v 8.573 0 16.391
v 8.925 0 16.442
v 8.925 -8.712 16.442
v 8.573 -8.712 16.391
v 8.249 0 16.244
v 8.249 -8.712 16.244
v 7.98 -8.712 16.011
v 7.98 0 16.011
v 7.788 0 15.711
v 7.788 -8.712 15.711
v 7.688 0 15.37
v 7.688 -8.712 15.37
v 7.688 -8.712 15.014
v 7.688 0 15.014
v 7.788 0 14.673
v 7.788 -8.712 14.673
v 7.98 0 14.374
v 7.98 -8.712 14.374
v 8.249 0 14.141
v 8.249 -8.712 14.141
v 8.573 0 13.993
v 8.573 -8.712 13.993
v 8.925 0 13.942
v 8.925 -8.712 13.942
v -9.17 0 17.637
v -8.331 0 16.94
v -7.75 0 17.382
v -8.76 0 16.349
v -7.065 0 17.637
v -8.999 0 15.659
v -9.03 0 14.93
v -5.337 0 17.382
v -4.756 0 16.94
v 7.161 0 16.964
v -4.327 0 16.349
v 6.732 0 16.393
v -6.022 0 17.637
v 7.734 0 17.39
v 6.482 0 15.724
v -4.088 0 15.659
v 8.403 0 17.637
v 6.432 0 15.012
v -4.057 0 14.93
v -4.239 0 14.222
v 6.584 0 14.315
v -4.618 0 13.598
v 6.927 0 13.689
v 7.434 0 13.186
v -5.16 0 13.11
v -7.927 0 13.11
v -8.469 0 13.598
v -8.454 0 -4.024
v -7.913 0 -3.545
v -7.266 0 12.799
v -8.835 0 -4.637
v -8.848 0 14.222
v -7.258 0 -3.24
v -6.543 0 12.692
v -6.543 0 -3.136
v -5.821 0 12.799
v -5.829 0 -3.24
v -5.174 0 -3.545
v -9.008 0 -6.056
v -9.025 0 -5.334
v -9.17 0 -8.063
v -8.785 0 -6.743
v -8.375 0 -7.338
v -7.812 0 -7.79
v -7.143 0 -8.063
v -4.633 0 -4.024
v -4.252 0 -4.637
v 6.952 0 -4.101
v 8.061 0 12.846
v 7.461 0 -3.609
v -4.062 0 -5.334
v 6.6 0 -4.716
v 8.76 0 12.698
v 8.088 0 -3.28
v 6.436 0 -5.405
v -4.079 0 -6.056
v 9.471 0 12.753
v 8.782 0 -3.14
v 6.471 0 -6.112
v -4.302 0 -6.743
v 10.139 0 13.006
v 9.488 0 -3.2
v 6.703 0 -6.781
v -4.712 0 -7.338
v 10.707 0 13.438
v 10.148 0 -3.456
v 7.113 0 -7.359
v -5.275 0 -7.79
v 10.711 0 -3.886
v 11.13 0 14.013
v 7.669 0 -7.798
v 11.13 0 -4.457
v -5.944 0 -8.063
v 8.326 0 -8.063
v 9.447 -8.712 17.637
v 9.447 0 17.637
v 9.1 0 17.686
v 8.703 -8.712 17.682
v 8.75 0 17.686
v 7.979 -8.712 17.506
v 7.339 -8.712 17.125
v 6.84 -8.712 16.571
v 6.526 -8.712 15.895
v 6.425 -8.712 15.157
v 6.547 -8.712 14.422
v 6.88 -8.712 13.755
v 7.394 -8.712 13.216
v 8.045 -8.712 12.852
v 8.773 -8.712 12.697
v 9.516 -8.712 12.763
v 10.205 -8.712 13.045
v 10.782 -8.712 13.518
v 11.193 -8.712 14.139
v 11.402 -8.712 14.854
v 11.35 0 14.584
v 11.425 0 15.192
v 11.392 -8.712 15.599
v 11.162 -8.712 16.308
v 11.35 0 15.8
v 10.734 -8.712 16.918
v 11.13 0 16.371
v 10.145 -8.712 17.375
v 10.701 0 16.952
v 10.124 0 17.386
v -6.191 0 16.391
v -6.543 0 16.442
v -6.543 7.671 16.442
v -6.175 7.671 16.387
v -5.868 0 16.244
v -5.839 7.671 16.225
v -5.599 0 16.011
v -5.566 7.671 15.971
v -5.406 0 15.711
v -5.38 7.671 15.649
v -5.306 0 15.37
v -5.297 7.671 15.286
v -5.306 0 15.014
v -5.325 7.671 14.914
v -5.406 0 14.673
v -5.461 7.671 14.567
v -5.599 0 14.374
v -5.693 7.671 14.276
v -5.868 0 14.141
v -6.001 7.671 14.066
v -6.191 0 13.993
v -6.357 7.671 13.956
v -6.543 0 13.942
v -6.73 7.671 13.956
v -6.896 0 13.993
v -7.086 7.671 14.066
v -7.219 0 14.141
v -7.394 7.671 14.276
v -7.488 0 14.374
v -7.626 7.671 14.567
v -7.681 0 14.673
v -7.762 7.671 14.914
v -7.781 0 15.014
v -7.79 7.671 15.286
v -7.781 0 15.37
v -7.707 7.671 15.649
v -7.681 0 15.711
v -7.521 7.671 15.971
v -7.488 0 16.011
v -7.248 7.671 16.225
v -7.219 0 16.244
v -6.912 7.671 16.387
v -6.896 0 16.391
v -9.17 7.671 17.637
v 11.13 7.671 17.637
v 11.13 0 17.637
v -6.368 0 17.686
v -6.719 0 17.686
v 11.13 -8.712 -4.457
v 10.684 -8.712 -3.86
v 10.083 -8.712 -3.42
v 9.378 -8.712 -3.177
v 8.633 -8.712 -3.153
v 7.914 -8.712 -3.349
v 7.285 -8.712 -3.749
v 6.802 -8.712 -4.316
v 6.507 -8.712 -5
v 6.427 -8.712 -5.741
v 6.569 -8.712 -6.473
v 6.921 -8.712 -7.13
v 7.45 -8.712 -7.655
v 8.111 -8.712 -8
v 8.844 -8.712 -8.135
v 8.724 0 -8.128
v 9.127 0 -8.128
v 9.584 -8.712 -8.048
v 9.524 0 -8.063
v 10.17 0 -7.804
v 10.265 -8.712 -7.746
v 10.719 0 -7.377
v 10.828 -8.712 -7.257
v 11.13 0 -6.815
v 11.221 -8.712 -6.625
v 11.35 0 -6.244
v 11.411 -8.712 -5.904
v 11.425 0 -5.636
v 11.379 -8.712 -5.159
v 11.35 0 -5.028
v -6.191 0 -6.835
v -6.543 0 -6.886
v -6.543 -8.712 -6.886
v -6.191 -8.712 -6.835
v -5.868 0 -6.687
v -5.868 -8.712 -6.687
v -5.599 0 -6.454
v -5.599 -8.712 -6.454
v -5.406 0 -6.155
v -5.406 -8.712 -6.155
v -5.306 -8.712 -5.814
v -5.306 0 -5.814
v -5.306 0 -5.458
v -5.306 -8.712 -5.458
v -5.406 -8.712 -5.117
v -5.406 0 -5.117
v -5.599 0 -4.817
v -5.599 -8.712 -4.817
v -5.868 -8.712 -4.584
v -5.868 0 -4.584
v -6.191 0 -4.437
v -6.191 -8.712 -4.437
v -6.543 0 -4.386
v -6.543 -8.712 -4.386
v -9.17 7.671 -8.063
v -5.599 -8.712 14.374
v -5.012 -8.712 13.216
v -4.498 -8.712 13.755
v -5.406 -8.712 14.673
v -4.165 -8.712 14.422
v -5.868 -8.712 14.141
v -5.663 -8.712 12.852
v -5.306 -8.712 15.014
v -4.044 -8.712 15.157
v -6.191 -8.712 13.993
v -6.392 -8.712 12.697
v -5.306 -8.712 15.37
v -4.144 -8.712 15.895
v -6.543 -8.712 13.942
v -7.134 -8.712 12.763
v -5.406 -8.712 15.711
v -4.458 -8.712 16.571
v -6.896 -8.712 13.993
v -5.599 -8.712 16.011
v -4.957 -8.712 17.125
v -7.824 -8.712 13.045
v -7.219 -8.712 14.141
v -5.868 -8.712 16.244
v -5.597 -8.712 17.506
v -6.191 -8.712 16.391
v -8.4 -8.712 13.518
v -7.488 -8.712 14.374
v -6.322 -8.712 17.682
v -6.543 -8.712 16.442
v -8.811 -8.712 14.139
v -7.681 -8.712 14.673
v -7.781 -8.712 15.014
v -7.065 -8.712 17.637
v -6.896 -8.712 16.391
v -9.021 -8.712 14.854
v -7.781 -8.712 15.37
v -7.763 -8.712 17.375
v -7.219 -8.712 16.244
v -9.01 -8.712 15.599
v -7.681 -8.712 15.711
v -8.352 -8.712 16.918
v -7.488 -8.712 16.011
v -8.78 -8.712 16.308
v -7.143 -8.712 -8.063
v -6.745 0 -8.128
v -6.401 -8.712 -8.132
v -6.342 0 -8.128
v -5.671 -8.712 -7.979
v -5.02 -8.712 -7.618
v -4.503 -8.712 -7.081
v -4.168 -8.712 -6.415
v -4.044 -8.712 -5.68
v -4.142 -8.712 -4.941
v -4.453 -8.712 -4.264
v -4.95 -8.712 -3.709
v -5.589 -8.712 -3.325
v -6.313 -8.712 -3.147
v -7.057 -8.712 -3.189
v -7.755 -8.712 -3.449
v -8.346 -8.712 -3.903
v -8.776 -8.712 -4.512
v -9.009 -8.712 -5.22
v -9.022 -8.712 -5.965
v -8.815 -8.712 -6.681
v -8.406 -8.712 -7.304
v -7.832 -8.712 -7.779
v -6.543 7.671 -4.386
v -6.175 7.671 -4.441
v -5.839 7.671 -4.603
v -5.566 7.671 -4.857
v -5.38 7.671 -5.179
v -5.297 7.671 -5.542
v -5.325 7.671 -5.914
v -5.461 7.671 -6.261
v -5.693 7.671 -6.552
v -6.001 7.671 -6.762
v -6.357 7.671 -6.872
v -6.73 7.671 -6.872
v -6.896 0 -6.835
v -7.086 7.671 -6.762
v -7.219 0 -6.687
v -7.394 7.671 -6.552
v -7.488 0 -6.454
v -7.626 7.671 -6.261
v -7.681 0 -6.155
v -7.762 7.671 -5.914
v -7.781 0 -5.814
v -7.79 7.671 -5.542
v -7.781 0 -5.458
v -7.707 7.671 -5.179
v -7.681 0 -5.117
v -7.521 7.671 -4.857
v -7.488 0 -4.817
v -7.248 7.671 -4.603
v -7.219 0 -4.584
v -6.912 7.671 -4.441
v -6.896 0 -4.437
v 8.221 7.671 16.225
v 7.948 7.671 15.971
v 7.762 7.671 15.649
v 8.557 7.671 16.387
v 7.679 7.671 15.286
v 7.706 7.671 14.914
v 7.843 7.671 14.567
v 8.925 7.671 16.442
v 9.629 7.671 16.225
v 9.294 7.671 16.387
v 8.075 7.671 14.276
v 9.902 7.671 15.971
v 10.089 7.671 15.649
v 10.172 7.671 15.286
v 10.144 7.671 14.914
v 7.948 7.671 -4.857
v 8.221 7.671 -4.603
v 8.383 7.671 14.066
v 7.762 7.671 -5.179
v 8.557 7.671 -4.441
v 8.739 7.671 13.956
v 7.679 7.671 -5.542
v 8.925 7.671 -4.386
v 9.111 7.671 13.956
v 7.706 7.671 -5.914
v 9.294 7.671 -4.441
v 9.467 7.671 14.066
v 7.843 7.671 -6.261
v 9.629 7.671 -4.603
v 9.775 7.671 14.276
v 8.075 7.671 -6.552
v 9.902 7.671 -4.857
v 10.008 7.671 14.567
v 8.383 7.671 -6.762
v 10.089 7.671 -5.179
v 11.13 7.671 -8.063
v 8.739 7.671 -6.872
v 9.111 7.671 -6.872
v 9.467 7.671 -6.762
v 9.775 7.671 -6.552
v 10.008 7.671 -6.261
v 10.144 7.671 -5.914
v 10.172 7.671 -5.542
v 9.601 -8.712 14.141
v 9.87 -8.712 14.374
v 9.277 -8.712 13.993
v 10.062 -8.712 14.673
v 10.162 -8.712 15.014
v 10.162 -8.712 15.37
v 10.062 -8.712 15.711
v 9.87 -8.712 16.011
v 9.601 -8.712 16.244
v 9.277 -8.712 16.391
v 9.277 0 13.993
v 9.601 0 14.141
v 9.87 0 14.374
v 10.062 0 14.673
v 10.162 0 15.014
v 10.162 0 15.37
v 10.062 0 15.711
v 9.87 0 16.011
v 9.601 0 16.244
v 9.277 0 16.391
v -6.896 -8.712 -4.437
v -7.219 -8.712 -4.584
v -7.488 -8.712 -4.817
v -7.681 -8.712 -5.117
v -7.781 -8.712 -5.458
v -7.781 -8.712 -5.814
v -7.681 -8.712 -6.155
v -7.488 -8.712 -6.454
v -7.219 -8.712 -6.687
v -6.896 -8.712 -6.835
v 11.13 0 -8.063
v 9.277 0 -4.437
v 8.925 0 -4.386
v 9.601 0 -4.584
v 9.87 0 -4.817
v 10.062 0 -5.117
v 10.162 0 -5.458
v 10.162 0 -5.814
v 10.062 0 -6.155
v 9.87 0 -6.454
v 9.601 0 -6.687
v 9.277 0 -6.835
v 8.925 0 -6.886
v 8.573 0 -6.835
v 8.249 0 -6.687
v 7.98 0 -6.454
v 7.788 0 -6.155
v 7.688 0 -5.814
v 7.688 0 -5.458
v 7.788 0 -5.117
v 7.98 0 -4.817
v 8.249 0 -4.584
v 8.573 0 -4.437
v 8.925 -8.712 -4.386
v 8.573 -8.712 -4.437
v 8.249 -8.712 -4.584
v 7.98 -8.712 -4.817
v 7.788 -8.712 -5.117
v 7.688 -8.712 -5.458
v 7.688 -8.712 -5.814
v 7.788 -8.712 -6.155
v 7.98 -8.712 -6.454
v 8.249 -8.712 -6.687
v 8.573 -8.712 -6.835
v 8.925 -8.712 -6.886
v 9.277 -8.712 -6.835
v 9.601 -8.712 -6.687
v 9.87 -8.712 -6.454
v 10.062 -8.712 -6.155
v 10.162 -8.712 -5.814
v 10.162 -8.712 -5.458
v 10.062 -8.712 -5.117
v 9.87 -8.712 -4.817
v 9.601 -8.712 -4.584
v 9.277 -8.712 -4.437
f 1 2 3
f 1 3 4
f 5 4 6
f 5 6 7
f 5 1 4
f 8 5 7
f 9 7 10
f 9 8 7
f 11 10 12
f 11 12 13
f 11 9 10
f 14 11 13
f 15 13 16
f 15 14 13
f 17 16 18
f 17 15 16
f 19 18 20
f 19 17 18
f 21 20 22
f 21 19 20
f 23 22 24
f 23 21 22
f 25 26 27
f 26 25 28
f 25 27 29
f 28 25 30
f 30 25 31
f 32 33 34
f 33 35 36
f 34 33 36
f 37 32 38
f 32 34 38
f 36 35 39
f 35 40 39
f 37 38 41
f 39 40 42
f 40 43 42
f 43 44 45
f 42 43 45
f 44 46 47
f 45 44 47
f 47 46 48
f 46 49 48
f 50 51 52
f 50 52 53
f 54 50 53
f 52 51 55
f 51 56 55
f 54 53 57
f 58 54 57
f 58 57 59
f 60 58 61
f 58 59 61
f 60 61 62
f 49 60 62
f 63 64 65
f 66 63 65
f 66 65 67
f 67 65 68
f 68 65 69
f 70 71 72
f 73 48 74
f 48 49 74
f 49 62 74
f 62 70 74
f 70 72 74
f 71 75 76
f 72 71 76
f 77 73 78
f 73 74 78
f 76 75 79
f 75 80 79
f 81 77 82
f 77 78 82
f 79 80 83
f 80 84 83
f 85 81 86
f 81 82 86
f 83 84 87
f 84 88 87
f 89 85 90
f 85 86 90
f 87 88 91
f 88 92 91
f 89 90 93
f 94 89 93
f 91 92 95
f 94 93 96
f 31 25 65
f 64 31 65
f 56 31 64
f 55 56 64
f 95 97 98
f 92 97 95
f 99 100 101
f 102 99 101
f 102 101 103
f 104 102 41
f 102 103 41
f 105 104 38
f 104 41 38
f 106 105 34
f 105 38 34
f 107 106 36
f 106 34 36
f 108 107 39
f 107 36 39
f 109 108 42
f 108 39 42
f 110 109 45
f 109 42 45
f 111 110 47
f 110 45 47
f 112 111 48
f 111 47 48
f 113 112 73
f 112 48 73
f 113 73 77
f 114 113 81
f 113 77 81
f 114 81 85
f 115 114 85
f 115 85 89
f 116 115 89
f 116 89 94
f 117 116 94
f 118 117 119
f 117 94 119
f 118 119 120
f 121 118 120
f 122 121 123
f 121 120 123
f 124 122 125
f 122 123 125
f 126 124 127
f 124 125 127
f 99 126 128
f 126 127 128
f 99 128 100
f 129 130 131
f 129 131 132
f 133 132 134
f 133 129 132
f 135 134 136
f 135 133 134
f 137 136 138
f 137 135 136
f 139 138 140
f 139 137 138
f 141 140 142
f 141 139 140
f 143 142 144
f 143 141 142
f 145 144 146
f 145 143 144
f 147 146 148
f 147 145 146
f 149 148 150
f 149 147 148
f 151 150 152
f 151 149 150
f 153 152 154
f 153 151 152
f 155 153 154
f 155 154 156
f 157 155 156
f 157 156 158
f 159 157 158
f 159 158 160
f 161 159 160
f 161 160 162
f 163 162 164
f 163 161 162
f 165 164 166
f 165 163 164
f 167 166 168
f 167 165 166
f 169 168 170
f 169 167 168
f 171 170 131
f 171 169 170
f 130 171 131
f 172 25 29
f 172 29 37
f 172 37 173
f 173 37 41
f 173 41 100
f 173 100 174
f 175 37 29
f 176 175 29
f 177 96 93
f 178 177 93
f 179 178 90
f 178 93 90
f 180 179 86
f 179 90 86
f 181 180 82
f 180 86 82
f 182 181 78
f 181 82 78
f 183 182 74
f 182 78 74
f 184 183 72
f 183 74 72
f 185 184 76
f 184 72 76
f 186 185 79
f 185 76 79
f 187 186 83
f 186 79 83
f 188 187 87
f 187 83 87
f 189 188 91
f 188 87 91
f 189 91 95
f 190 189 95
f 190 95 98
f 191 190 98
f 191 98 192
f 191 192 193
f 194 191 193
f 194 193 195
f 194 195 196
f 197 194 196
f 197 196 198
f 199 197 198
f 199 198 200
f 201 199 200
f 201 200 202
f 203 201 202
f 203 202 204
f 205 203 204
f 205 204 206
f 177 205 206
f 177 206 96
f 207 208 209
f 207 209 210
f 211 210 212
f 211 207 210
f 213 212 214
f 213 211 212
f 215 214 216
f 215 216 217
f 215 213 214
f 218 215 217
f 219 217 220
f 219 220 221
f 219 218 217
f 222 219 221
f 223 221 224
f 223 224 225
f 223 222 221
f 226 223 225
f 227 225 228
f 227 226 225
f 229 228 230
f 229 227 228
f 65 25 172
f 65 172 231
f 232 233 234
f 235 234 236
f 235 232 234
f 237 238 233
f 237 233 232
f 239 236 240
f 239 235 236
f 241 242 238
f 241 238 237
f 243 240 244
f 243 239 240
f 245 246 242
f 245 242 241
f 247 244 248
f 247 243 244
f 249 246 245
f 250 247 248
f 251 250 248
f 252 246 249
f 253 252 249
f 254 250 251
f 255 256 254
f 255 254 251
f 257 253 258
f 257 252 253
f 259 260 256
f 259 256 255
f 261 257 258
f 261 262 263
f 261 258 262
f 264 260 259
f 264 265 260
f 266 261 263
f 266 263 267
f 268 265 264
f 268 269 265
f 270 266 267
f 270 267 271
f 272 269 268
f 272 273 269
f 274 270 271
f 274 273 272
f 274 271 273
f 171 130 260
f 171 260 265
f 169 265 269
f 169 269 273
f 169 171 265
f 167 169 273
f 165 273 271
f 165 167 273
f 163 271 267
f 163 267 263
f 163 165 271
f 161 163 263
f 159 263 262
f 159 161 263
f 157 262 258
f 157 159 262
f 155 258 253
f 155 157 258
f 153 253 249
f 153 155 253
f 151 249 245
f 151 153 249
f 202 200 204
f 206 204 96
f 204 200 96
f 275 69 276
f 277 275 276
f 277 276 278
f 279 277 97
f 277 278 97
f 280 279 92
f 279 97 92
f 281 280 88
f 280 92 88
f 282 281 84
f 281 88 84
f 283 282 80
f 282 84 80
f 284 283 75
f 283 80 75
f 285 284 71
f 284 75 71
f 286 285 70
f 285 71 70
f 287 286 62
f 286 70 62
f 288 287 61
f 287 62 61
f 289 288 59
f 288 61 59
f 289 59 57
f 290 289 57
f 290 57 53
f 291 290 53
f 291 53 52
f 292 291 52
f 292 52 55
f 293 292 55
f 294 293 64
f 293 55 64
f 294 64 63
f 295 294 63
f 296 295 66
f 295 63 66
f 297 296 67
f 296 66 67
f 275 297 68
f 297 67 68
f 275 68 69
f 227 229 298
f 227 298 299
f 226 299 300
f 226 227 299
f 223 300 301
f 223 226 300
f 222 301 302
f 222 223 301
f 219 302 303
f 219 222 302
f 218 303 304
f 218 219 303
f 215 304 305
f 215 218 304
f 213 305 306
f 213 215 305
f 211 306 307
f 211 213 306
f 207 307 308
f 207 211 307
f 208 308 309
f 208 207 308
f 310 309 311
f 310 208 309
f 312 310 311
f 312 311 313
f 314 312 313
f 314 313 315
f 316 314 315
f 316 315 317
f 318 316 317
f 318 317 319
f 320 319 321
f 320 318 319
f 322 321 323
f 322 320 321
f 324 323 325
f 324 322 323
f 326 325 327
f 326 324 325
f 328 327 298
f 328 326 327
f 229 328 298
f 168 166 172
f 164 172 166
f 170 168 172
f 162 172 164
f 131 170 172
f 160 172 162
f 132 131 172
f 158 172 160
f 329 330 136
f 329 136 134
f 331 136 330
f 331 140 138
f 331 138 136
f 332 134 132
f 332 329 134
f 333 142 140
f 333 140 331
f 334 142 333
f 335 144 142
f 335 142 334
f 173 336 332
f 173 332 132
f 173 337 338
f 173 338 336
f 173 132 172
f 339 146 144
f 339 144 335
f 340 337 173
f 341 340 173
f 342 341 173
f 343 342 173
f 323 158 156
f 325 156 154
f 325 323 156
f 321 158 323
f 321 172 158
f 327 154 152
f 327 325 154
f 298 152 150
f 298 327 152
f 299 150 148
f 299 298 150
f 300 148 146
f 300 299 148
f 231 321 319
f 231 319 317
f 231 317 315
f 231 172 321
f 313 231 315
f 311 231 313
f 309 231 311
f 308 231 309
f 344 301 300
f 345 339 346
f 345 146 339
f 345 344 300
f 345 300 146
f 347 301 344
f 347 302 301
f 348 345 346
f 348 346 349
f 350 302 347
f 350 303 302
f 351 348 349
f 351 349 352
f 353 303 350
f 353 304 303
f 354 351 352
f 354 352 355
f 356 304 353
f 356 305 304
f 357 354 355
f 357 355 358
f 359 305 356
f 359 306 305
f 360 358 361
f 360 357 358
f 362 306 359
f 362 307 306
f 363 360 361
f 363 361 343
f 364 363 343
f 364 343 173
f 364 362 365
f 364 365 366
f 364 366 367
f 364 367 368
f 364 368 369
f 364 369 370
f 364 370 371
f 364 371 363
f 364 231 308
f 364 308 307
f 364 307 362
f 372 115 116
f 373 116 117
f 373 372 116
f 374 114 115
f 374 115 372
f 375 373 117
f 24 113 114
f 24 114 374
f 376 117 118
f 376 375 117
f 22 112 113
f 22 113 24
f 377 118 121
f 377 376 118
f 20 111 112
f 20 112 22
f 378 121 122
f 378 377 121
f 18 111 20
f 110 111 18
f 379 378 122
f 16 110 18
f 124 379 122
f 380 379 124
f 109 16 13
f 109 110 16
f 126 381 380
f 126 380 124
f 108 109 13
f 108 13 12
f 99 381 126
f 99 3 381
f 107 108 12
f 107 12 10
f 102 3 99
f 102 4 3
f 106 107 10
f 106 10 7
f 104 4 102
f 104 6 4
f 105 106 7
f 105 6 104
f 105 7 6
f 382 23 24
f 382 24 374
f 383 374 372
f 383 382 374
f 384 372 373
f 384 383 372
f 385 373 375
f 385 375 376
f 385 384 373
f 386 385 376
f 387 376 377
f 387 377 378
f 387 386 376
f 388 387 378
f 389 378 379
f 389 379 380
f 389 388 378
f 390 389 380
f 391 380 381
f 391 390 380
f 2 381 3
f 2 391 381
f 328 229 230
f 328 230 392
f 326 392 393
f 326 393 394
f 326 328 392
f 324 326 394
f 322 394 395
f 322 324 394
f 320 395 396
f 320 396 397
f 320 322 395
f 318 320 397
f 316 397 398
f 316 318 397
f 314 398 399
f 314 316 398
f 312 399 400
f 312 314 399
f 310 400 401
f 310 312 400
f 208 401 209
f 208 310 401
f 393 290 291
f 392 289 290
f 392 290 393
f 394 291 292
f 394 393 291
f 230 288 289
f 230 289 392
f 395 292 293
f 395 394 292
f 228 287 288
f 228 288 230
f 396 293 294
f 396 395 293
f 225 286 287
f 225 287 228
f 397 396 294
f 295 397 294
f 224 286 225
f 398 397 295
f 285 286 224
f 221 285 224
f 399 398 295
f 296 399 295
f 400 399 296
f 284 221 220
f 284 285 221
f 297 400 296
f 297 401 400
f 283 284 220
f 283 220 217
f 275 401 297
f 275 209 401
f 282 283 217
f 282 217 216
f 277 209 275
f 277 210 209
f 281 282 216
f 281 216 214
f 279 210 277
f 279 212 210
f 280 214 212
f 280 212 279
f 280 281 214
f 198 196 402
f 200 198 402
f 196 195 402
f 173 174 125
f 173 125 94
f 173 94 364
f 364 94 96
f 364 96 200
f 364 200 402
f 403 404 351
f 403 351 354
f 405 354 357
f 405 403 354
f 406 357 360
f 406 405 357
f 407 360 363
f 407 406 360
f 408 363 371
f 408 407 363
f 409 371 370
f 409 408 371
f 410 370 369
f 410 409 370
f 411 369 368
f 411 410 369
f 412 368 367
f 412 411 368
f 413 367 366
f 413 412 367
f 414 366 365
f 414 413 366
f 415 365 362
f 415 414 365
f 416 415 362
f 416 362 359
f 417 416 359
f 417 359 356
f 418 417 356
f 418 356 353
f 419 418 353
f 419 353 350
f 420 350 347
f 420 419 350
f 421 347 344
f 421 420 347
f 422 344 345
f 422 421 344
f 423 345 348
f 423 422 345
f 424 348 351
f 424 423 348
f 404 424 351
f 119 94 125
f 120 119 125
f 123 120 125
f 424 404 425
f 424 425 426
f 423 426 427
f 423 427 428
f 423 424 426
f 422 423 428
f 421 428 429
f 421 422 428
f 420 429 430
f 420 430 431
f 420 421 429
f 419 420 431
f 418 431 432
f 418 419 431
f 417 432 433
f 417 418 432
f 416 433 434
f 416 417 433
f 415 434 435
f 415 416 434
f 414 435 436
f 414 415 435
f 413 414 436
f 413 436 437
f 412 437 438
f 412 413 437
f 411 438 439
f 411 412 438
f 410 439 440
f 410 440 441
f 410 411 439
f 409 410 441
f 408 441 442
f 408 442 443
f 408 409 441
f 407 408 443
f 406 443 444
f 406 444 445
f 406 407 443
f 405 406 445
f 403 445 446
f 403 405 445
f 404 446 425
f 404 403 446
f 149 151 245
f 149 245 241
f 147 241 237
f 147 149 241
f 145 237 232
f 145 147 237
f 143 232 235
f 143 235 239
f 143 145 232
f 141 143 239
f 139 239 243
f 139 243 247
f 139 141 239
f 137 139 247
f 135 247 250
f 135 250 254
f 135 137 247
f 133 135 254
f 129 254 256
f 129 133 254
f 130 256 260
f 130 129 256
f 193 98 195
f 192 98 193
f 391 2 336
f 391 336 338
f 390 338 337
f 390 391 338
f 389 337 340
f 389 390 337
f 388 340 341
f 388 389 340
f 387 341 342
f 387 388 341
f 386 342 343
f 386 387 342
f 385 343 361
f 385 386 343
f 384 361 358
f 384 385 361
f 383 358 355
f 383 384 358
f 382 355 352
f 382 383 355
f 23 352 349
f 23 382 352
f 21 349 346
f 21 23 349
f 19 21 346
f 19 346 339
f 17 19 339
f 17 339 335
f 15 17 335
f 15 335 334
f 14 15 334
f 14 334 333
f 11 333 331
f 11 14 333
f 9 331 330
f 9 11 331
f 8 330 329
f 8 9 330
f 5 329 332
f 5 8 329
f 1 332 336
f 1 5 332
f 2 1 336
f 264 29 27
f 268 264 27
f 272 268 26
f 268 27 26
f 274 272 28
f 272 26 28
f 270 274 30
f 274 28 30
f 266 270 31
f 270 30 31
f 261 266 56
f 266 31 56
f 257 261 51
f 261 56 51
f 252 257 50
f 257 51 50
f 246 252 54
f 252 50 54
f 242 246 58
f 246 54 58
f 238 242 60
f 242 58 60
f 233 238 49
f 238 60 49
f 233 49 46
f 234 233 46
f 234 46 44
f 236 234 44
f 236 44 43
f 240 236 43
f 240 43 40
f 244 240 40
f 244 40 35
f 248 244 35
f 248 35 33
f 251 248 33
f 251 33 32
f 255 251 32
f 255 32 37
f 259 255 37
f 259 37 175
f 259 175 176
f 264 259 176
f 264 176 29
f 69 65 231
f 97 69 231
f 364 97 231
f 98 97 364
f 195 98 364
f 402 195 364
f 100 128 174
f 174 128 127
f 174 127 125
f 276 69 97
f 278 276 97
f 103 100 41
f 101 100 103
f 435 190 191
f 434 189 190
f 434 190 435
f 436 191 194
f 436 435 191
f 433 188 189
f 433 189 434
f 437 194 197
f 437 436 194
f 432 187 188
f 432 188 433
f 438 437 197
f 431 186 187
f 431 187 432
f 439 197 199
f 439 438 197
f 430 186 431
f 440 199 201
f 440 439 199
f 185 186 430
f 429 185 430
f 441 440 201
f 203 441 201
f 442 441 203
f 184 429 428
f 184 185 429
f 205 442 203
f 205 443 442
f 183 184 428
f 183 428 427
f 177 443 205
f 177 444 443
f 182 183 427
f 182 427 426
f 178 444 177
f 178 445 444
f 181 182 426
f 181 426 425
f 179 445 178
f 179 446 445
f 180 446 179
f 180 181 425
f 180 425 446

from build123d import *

# Parameters (mm, degrees)
SKETCH1_W               = 20.3
SKETCH1_H               = 25.7
BOSS_EXTRUDE1_DEPTH     = 7.6708
SKETCH2_R               = 2.5
SKETCH2_R_2             = 1.25
BOSS_EXTRUDE2_DEPTH     = 8.7122
CUT_EXTRUDE1_DEPTH      = 27.682326303
CUT_EXTRUDE1_DEPTH_BACK = 27.682326303
SKETCH3_R               = 1.25


with BuildPart() as part:
    # Sketch1 → Boss-Extrude1 (new body)
    with BuildSketch(Plane(origin=(0, 0, 0), x_dir=(1, 0, 0), z_dir=(0, 1, 0))):
        with Locations((0.979781162, -4.787001603)):
            Rectangle(SKETCH1_W, SKETCH1_H)
    extrude(amount=BOSS_EXTRUDE1_DEPTH)

    # Sketch2 → Boss-Extrude2 (add)
    # profile 1 of 4: a face of its own
    with BuildSketch(Plane(origin=(0, 0, 0), x_dir=(-1, 0, 0), z_dir=(0, -1, 0))):
        with Locations(Location((6.543467427, -15.1920941, 0), (0, 0, 282.050765662))):
            Circle(SKETCH2_R)
        with Locations(Location((6.543467427, -15.1920941, 0), (0, 0, 90))):
            Circle(SKETCH2_R_2, mode=Mode.SUBTRACT)
    # profile 2 of 4: a face of its own
    with BuildSketch(Plane(origin=(0, 0, 0), x_dir=(-1, 0, 0), z_dir=(0, -1, 0))):
        with Locations(Location((-8.925132573, -15.1920941, 0), (0, 0, 257.949234338))):
            Circle(SKETCH2_R)
        with Locations(Location((-8.925132573, -15.1920941, 0), (0, 0, 90))):
            Circle(SKETCH2_R_2, mode=Mode.SUBTRACT)
    # profile 3 of 4: a face of its own
    with BuildSketch(Plane(origin=(0, 0, 0), x_dir=(-1, 0, 0), z_dir=(0, -1, 0))):
        with Locations(Location((-8.925132573, 5.6359059, 0), (0, 0, 208.132514033))):
            Circle(SKETCH2_R)
        with Locations(Location((-8.925132573, 5.6359059, 0), (0, 0, 90))):
            Circle(SKETCH2_R_2, mode=Mode.SUBTRACT)
    # profile 4 of 4: a face of its own
    with BuildSketch(Plane(origin=(0, 0, 0), x_dir=(-1, 0, 0), z_dir=(0, -1, 0))):
        with Locations(Location((6.543467427, 5.6359059, 0), (0, 0, 76.12877324))):
            Circle(SKETCH2_R)
        with Locations(Location((6.543467427, 5.6359059, 0), (0, 0, 90))):
            Circle(SKETCH2_R_2, mode=Mode.SUBTRACT)
    extrude(amount=BOSS_EXTRUDE2_DEPTH)

    # Sketch3 → Cut-Extrude1 (cut, two sides: drawn at the far end of the back side and taken through both)
    with BuildSketch(Plane(origin=(0, 7.6708, 0), x_dir=(1, 0, 0), z_dir=(0, 1, 0)).offset(-CUT_EXTRUDE1_DEPTH_BACK)):
        with Locations(Location((8.925132573, 5.6359059, 0), (0, 0, 270))):
            Circle(SKETCH3_R)
        with Locations(Location((-6.543467427, 5.6359059, 0), (0, 0, 270))):
            Circle(SKETCH3_R)
        with Locations(Location((8.925132573, -15.1920941, 0), (0, 0, 270))):
            Circle(SKETCH3_R)
        with Locations(Location((-6.543467427, -15.1920941, 0), (0, 0, 270))):
            Circle(SKETCH3_R)
    extrude(amount=CUT_EXTRUDE1_DEPTH + CUT_EXTRUDE1_DEPTH_BACK, mode=Mode.SUBTRACT)


solid = part.part
